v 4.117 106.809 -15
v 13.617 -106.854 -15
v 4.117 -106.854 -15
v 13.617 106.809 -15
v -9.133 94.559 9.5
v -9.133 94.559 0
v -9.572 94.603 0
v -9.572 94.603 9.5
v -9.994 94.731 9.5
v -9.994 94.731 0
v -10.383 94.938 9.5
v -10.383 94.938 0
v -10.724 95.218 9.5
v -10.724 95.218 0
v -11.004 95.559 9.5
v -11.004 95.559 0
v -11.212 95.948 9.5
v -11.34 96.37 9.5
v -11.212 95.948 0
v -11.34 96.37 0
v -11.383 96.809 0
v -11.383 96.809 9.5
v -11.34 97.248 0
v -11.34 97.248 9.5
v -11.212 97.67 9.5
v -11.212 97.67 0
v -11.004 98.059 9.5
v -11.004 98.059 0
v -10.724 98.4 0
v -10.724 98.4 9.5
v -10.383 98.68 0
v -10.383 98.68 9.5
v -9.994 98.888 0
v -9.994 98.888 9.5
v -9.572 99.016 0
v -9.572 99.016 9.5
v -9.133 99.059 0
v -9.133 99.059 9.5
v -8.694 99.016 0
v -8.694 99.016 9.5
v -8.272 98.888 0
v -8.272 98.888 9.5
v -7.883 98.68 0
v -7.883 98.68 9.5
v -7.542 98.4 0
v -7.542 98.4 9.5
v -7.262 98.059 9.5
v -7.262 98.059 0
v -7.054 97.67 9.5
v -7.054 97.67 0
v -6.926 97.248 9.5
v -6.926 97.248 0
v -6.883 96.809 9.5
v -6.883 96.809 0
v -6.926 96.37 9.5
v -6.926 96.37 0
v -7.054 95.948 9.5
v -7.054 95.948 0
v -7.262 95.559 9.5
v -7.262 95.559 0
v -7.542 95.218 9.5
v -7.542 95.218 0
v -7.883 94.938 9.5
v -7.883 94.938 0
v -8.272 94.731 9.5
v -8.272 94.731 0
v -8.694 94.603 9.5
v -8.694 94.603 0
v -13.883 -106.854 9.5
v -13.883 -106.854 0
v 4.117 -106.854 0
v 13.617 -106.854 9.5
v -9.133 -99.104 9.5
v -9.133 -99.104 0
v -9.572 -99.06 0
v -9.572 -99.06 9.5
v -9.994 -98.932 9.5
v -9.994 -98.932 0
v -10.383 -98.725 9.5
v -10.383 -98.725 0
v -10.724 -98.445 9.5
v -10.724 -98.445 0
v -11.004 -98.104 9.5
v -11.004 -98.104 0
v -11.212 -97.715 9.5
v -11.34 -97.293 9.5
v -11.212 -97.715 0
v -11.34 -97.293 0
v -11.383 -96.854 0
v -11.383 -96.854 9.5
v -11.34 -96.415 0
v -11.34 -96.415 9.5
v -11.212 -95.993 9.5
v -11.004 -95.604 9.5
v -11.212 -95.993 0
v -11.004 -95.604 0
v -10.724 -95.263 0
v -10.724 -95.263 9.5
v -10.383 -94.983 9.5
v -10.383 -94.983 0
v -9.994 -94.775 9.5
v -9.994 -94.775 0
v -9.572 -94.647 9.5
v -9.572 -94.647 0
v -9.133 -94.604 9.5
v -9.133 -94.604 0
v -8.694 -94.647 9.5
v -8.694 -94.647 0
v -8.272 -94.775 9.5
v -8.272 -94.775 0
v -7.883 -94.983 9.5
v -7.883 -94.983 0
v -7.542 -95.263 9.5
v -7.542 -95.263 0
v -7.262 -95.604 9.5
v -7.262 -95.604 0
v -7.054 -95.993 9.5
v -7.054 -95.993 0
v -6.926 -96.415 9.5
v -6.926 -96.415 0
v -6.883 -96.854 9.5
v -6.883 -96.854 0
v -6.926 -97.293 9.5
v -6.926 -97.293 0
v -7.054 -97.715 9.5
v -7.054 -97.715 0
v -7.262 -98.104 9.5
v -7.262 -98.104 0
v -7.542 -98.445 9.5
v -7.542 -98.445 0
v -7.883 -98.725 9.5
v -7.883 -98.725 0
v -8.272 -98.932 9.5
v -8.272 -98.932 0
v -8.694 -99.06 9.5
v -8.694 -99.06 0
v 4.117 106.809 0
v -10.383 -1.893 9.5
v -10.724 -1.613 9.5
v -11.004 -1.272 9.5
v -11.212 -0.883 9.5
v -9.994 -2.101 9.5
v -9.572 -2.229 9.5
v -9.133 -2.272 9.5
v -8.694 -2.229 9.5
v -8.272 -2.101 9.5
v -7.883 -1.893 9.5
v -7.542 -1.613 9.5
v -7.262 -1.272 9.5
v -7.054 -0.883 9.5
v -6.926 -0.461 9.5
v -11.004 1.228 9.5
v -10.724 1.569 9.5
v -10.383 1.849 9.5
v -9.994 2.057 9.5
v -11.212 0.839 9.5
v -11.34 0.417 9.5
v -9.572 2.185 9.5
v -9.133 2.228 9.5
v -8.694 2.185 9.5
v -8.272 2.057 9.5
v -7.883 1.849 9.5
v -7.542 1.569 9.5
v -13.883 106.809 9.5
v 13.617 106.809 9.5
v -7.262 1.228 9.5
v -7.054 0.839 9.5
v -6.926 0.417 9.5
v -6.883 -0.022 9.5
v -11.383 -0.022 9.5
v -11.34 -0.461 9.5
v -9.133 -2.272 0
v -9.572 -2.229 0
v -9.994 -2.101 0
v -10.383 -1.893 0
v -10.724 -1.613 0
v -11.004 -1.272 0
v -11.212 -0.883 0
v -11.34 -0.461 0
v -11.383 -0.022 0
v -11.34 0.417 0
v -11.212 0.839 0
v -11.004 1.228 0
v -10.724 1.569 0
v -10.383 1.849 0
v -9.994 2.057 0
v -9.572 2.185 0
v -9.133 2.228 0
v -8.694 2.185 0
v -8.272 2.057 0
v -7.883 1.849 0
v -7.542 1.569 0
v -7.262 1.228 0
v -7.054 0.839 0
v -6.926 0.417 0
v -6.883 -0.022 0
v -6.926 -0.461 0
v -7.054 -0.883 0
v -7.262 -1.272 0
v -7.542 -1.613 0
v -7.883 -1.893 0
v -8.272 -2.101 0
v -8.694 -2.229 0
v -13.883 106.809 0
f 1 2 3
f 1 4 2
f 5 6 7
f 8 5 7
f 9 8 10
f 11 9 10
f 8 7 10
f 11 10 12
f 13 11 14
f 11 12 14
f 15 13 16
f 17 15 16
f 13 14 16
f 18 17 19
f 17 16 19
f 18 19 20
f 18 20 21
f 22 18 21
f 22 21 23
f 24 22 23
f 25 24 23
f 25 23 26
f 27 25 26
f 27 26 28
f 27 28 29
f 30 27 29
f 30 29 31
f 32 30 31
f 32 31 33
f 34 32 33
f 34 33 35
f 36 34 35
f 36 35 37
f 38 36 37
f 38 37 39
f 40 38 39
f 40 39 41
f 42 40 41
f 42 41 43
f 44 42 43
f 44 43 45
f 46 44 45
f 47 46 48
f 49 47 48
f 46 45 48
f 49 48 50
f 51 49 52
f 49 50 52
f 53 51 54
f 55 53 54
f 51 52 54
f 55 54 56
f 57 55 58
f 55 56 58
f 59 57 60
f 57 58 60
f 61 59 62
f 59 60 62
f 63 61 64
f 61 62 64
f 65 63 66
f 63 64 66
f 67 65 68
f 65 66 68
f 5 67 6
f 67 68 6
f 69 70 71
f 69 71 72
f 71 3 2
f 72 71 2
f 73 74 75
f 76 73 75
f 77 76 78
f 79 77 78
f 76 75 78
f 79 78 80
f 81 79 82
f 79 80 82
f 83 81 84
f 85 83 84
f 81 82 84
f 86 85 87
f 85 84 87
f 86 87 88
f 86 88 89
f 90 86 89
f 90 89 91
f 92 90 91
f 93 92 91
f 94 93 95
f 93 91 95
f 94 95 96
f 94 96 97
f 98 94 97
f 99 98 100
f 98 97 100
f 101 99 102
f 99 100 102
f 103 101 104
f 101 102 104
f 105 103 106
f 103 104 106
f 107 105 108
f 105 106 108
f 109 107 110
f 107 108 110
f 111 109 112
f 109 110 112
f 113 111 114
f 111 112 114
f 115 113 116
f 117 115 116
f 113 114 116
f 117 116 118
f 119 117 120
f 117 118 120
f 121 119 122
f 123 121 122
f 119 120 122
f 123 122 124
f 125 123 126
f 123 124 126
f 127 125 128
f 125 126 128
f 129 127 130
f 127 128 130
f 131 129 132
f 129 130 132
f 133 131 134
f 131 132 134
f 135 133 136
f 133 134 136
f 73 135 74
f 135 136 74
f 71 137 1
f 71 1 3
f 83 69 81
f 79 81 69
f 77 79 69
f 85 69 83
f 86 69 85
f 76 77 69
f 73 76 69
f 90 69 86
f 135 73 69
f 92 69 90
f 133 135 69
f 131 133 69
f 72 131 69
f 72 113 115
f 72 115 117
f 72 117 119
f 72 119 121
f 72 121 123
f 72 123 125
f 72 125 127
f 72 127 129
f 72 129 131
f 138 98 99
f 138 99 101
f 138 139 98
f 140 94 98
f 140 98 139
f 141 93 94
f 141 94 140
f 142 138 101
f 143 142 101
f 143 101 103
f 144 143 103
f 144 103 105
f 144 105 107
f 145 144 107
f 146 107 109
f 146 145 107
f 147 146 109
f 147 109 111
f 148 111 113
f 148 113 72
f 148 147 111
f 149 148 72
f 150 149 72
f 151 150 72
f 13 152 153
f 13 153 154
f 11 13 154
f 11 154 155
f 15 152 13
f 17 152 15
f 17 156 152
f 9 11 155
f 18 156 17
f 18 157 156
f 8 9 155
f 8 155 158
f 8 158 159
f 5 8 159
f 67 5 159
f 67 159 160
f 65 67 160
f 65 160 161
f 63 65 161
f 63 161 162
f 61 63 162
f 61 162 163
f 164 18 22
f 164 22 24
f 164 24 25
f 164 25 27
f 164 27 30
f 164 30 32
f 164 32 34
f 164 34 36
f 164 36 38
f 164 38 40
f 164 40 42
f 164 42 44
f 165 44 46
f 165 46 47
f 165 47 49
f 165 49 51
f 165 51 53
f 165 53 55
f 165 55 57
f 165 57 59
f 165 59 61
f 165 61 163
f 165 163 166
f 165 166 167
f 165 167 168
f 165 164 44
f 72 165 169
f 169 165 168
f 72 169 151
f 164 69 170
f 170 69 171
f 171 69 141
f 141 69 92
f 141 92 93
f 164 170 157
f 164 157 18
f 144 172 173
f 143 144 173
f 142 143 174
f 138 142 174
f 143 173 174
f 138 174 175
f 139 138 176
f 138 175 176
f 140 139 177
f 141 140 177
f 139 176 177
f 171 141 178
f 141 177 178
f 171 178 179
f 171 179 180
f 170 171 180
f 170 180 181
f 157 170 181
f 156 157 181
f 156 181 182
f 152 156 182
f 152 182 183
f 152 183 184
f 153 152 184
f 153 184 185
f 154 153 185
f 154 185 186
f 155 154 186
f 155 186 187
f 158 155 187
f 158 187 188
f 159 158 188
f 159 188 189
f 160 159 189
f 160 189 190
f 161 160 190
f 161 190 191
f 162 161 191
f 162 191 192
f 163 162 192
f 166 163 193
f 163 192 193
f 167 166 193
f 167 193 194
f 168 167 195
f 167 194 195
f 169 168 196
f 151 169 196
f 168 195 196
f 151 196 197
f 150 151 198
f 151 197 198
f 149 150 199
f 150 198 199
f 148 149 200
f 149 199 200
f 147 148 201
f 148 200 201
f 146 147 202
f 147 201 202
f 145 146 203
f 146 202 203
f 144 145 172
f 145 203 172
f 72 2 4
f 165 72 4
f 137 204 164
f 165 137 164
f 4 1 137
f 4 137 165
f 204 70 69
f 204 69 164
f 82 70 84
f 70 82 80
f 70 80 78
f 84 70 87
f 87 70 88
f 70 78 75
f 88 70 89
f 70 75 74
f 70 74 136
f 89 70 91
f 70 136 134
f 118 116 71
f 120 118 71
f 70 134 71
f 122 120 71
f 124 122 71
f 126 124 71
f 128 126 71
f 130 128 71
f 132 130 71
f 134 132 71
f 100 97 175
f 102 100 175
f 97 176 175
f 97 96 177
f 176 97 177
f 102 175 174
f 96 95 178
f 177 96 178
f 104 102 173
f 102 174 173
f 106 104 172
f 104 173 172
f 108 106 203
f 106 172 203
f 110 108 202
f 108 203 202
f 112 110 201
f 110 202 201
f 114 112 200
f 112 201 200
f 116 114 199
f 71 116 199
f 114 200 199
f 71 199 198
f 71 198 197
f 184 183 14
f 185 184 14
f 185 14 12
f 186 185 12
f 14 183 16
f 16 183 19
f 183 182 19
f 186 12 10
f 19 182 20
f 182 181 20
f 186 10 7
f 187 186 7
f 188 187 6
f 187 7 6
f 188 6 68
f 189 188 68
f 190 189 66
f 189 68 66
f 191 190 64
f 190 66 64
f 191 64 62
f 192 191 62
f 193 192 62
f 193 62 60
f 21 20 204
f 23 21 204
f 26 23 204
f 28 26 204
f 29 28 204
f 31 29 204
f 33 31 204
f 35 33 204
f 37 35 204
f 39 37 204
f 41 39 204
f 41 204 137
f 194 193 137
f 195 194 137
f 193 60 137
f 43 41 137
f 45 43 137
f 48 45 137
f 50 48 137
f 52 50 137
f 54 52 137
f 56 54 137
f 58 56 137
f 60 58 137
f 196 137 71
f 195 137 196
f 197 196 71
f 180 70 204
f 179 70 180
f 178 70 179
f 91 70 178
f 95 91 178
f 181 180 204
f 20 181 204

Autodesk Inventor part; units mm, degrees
ref_plane "YZ Plane" through (0, 0, 0) normal (1, 0, 0) x (0, 1, 0)
ref_plane "XZ Plane" through (0, 0, 0) normal (0, 1, 0) x (-1, 0, 0)
ref_plane "XY Plane" through (0, 0, 0) normal (0, 0, 1) x (1, 0, 0)
sketch "Esboço1" plane through (0, 0, 0) normal (0, 0, 1) x (1, 0, 0)
  line L0 (3.6169, 102.1463) -> (3.6169, -101.8537)
  line L1 (-13.8831, -106.8537) -> (-13.8831, 106.8093)
  line L2 (-13.8831, -106.8537) -> (-4.3831, -106.8537)
  line L3 (-13.8831, 106.8093) -> (-4.3831, 106.8093)
  circle A0 centre (-9.1331, -96.8537) radius 1.621
  circle A1 centre (-9.1331, -0.0222) radius 1.621
  circle A2 centre (-9.1331, 96.8093) radius 1.621
  line L4 (-13.8831, -106.8537) -> (13.6169, -106.8537)
  line L5 (13.6169, -106.8537) -> (13.6169, 106.8093)
  line L6 (13.6169, 106.8093) -> (-13.8831, 106.8093)
  line L7 (-13.8831, 106.8093) -> (-13.8831, -106.8537)
  point P0 (0, 0)
  point P1 (-13.8831, -10.6907)
  dimension "d0" = 0
  dimension "d1" = 10
extrude "Extrusão1" add sketch "Esboço1" along normal blind 9.5
sketch "Esboço2" plane through (0, 0, 0) normal (0, 0, -1) x (-1, 0, 0)
  line L0 (-13.6169, 106.8093) -> (13.8831, 106.8093) projected
  line L1 (13.8831, -106.8537) -> (-13.6169, -106.8537) projected
  line L2 (-13.6169, 106.8093) -> (-4.1169, 106.8093)
  line L3 (-4.1169, 106.8093) -> (-4.1169, -106.8537)
  line L4 (-4.1169, -106.8537) -> (-13.6169, -106.8537)
  line L5 (-13.6169, -106.8537) -> (-13.6169, 106.8093)
  point P0 (0, 0)
  dimension "d4" = 9.5
extrude "Extrusão2" add sketch "Esboço2" along normal blind 15
sketch "Esboço3" plane through (0, 0, 9.5) normal (0, 0, 1) x (1, 0, 0)
  circle A0 centre (-9.1331, -96.8537) radius 1.621 projected
  circle A1 centre (-9.1331, -0.0222) radius 1.621 projected
  circle A2 centre (-9.1331, 96.8093) radius 1.621 projected
  point P0 (0, 0)
hole "Furo1" at (-9.1331, -96.8537, 9.5) at (-9.1331, -0.0222, 9.5) at (-9.1331, 96.8093, 9.5) direction (0, 0, -1) diameter 4.5 end through all clearance for "Countersunk Flat Head Screw ISO 2009/7046" size "M4" standard "ISO"
properties part number "Guia lateral do top" material "Alumínio 6061"
